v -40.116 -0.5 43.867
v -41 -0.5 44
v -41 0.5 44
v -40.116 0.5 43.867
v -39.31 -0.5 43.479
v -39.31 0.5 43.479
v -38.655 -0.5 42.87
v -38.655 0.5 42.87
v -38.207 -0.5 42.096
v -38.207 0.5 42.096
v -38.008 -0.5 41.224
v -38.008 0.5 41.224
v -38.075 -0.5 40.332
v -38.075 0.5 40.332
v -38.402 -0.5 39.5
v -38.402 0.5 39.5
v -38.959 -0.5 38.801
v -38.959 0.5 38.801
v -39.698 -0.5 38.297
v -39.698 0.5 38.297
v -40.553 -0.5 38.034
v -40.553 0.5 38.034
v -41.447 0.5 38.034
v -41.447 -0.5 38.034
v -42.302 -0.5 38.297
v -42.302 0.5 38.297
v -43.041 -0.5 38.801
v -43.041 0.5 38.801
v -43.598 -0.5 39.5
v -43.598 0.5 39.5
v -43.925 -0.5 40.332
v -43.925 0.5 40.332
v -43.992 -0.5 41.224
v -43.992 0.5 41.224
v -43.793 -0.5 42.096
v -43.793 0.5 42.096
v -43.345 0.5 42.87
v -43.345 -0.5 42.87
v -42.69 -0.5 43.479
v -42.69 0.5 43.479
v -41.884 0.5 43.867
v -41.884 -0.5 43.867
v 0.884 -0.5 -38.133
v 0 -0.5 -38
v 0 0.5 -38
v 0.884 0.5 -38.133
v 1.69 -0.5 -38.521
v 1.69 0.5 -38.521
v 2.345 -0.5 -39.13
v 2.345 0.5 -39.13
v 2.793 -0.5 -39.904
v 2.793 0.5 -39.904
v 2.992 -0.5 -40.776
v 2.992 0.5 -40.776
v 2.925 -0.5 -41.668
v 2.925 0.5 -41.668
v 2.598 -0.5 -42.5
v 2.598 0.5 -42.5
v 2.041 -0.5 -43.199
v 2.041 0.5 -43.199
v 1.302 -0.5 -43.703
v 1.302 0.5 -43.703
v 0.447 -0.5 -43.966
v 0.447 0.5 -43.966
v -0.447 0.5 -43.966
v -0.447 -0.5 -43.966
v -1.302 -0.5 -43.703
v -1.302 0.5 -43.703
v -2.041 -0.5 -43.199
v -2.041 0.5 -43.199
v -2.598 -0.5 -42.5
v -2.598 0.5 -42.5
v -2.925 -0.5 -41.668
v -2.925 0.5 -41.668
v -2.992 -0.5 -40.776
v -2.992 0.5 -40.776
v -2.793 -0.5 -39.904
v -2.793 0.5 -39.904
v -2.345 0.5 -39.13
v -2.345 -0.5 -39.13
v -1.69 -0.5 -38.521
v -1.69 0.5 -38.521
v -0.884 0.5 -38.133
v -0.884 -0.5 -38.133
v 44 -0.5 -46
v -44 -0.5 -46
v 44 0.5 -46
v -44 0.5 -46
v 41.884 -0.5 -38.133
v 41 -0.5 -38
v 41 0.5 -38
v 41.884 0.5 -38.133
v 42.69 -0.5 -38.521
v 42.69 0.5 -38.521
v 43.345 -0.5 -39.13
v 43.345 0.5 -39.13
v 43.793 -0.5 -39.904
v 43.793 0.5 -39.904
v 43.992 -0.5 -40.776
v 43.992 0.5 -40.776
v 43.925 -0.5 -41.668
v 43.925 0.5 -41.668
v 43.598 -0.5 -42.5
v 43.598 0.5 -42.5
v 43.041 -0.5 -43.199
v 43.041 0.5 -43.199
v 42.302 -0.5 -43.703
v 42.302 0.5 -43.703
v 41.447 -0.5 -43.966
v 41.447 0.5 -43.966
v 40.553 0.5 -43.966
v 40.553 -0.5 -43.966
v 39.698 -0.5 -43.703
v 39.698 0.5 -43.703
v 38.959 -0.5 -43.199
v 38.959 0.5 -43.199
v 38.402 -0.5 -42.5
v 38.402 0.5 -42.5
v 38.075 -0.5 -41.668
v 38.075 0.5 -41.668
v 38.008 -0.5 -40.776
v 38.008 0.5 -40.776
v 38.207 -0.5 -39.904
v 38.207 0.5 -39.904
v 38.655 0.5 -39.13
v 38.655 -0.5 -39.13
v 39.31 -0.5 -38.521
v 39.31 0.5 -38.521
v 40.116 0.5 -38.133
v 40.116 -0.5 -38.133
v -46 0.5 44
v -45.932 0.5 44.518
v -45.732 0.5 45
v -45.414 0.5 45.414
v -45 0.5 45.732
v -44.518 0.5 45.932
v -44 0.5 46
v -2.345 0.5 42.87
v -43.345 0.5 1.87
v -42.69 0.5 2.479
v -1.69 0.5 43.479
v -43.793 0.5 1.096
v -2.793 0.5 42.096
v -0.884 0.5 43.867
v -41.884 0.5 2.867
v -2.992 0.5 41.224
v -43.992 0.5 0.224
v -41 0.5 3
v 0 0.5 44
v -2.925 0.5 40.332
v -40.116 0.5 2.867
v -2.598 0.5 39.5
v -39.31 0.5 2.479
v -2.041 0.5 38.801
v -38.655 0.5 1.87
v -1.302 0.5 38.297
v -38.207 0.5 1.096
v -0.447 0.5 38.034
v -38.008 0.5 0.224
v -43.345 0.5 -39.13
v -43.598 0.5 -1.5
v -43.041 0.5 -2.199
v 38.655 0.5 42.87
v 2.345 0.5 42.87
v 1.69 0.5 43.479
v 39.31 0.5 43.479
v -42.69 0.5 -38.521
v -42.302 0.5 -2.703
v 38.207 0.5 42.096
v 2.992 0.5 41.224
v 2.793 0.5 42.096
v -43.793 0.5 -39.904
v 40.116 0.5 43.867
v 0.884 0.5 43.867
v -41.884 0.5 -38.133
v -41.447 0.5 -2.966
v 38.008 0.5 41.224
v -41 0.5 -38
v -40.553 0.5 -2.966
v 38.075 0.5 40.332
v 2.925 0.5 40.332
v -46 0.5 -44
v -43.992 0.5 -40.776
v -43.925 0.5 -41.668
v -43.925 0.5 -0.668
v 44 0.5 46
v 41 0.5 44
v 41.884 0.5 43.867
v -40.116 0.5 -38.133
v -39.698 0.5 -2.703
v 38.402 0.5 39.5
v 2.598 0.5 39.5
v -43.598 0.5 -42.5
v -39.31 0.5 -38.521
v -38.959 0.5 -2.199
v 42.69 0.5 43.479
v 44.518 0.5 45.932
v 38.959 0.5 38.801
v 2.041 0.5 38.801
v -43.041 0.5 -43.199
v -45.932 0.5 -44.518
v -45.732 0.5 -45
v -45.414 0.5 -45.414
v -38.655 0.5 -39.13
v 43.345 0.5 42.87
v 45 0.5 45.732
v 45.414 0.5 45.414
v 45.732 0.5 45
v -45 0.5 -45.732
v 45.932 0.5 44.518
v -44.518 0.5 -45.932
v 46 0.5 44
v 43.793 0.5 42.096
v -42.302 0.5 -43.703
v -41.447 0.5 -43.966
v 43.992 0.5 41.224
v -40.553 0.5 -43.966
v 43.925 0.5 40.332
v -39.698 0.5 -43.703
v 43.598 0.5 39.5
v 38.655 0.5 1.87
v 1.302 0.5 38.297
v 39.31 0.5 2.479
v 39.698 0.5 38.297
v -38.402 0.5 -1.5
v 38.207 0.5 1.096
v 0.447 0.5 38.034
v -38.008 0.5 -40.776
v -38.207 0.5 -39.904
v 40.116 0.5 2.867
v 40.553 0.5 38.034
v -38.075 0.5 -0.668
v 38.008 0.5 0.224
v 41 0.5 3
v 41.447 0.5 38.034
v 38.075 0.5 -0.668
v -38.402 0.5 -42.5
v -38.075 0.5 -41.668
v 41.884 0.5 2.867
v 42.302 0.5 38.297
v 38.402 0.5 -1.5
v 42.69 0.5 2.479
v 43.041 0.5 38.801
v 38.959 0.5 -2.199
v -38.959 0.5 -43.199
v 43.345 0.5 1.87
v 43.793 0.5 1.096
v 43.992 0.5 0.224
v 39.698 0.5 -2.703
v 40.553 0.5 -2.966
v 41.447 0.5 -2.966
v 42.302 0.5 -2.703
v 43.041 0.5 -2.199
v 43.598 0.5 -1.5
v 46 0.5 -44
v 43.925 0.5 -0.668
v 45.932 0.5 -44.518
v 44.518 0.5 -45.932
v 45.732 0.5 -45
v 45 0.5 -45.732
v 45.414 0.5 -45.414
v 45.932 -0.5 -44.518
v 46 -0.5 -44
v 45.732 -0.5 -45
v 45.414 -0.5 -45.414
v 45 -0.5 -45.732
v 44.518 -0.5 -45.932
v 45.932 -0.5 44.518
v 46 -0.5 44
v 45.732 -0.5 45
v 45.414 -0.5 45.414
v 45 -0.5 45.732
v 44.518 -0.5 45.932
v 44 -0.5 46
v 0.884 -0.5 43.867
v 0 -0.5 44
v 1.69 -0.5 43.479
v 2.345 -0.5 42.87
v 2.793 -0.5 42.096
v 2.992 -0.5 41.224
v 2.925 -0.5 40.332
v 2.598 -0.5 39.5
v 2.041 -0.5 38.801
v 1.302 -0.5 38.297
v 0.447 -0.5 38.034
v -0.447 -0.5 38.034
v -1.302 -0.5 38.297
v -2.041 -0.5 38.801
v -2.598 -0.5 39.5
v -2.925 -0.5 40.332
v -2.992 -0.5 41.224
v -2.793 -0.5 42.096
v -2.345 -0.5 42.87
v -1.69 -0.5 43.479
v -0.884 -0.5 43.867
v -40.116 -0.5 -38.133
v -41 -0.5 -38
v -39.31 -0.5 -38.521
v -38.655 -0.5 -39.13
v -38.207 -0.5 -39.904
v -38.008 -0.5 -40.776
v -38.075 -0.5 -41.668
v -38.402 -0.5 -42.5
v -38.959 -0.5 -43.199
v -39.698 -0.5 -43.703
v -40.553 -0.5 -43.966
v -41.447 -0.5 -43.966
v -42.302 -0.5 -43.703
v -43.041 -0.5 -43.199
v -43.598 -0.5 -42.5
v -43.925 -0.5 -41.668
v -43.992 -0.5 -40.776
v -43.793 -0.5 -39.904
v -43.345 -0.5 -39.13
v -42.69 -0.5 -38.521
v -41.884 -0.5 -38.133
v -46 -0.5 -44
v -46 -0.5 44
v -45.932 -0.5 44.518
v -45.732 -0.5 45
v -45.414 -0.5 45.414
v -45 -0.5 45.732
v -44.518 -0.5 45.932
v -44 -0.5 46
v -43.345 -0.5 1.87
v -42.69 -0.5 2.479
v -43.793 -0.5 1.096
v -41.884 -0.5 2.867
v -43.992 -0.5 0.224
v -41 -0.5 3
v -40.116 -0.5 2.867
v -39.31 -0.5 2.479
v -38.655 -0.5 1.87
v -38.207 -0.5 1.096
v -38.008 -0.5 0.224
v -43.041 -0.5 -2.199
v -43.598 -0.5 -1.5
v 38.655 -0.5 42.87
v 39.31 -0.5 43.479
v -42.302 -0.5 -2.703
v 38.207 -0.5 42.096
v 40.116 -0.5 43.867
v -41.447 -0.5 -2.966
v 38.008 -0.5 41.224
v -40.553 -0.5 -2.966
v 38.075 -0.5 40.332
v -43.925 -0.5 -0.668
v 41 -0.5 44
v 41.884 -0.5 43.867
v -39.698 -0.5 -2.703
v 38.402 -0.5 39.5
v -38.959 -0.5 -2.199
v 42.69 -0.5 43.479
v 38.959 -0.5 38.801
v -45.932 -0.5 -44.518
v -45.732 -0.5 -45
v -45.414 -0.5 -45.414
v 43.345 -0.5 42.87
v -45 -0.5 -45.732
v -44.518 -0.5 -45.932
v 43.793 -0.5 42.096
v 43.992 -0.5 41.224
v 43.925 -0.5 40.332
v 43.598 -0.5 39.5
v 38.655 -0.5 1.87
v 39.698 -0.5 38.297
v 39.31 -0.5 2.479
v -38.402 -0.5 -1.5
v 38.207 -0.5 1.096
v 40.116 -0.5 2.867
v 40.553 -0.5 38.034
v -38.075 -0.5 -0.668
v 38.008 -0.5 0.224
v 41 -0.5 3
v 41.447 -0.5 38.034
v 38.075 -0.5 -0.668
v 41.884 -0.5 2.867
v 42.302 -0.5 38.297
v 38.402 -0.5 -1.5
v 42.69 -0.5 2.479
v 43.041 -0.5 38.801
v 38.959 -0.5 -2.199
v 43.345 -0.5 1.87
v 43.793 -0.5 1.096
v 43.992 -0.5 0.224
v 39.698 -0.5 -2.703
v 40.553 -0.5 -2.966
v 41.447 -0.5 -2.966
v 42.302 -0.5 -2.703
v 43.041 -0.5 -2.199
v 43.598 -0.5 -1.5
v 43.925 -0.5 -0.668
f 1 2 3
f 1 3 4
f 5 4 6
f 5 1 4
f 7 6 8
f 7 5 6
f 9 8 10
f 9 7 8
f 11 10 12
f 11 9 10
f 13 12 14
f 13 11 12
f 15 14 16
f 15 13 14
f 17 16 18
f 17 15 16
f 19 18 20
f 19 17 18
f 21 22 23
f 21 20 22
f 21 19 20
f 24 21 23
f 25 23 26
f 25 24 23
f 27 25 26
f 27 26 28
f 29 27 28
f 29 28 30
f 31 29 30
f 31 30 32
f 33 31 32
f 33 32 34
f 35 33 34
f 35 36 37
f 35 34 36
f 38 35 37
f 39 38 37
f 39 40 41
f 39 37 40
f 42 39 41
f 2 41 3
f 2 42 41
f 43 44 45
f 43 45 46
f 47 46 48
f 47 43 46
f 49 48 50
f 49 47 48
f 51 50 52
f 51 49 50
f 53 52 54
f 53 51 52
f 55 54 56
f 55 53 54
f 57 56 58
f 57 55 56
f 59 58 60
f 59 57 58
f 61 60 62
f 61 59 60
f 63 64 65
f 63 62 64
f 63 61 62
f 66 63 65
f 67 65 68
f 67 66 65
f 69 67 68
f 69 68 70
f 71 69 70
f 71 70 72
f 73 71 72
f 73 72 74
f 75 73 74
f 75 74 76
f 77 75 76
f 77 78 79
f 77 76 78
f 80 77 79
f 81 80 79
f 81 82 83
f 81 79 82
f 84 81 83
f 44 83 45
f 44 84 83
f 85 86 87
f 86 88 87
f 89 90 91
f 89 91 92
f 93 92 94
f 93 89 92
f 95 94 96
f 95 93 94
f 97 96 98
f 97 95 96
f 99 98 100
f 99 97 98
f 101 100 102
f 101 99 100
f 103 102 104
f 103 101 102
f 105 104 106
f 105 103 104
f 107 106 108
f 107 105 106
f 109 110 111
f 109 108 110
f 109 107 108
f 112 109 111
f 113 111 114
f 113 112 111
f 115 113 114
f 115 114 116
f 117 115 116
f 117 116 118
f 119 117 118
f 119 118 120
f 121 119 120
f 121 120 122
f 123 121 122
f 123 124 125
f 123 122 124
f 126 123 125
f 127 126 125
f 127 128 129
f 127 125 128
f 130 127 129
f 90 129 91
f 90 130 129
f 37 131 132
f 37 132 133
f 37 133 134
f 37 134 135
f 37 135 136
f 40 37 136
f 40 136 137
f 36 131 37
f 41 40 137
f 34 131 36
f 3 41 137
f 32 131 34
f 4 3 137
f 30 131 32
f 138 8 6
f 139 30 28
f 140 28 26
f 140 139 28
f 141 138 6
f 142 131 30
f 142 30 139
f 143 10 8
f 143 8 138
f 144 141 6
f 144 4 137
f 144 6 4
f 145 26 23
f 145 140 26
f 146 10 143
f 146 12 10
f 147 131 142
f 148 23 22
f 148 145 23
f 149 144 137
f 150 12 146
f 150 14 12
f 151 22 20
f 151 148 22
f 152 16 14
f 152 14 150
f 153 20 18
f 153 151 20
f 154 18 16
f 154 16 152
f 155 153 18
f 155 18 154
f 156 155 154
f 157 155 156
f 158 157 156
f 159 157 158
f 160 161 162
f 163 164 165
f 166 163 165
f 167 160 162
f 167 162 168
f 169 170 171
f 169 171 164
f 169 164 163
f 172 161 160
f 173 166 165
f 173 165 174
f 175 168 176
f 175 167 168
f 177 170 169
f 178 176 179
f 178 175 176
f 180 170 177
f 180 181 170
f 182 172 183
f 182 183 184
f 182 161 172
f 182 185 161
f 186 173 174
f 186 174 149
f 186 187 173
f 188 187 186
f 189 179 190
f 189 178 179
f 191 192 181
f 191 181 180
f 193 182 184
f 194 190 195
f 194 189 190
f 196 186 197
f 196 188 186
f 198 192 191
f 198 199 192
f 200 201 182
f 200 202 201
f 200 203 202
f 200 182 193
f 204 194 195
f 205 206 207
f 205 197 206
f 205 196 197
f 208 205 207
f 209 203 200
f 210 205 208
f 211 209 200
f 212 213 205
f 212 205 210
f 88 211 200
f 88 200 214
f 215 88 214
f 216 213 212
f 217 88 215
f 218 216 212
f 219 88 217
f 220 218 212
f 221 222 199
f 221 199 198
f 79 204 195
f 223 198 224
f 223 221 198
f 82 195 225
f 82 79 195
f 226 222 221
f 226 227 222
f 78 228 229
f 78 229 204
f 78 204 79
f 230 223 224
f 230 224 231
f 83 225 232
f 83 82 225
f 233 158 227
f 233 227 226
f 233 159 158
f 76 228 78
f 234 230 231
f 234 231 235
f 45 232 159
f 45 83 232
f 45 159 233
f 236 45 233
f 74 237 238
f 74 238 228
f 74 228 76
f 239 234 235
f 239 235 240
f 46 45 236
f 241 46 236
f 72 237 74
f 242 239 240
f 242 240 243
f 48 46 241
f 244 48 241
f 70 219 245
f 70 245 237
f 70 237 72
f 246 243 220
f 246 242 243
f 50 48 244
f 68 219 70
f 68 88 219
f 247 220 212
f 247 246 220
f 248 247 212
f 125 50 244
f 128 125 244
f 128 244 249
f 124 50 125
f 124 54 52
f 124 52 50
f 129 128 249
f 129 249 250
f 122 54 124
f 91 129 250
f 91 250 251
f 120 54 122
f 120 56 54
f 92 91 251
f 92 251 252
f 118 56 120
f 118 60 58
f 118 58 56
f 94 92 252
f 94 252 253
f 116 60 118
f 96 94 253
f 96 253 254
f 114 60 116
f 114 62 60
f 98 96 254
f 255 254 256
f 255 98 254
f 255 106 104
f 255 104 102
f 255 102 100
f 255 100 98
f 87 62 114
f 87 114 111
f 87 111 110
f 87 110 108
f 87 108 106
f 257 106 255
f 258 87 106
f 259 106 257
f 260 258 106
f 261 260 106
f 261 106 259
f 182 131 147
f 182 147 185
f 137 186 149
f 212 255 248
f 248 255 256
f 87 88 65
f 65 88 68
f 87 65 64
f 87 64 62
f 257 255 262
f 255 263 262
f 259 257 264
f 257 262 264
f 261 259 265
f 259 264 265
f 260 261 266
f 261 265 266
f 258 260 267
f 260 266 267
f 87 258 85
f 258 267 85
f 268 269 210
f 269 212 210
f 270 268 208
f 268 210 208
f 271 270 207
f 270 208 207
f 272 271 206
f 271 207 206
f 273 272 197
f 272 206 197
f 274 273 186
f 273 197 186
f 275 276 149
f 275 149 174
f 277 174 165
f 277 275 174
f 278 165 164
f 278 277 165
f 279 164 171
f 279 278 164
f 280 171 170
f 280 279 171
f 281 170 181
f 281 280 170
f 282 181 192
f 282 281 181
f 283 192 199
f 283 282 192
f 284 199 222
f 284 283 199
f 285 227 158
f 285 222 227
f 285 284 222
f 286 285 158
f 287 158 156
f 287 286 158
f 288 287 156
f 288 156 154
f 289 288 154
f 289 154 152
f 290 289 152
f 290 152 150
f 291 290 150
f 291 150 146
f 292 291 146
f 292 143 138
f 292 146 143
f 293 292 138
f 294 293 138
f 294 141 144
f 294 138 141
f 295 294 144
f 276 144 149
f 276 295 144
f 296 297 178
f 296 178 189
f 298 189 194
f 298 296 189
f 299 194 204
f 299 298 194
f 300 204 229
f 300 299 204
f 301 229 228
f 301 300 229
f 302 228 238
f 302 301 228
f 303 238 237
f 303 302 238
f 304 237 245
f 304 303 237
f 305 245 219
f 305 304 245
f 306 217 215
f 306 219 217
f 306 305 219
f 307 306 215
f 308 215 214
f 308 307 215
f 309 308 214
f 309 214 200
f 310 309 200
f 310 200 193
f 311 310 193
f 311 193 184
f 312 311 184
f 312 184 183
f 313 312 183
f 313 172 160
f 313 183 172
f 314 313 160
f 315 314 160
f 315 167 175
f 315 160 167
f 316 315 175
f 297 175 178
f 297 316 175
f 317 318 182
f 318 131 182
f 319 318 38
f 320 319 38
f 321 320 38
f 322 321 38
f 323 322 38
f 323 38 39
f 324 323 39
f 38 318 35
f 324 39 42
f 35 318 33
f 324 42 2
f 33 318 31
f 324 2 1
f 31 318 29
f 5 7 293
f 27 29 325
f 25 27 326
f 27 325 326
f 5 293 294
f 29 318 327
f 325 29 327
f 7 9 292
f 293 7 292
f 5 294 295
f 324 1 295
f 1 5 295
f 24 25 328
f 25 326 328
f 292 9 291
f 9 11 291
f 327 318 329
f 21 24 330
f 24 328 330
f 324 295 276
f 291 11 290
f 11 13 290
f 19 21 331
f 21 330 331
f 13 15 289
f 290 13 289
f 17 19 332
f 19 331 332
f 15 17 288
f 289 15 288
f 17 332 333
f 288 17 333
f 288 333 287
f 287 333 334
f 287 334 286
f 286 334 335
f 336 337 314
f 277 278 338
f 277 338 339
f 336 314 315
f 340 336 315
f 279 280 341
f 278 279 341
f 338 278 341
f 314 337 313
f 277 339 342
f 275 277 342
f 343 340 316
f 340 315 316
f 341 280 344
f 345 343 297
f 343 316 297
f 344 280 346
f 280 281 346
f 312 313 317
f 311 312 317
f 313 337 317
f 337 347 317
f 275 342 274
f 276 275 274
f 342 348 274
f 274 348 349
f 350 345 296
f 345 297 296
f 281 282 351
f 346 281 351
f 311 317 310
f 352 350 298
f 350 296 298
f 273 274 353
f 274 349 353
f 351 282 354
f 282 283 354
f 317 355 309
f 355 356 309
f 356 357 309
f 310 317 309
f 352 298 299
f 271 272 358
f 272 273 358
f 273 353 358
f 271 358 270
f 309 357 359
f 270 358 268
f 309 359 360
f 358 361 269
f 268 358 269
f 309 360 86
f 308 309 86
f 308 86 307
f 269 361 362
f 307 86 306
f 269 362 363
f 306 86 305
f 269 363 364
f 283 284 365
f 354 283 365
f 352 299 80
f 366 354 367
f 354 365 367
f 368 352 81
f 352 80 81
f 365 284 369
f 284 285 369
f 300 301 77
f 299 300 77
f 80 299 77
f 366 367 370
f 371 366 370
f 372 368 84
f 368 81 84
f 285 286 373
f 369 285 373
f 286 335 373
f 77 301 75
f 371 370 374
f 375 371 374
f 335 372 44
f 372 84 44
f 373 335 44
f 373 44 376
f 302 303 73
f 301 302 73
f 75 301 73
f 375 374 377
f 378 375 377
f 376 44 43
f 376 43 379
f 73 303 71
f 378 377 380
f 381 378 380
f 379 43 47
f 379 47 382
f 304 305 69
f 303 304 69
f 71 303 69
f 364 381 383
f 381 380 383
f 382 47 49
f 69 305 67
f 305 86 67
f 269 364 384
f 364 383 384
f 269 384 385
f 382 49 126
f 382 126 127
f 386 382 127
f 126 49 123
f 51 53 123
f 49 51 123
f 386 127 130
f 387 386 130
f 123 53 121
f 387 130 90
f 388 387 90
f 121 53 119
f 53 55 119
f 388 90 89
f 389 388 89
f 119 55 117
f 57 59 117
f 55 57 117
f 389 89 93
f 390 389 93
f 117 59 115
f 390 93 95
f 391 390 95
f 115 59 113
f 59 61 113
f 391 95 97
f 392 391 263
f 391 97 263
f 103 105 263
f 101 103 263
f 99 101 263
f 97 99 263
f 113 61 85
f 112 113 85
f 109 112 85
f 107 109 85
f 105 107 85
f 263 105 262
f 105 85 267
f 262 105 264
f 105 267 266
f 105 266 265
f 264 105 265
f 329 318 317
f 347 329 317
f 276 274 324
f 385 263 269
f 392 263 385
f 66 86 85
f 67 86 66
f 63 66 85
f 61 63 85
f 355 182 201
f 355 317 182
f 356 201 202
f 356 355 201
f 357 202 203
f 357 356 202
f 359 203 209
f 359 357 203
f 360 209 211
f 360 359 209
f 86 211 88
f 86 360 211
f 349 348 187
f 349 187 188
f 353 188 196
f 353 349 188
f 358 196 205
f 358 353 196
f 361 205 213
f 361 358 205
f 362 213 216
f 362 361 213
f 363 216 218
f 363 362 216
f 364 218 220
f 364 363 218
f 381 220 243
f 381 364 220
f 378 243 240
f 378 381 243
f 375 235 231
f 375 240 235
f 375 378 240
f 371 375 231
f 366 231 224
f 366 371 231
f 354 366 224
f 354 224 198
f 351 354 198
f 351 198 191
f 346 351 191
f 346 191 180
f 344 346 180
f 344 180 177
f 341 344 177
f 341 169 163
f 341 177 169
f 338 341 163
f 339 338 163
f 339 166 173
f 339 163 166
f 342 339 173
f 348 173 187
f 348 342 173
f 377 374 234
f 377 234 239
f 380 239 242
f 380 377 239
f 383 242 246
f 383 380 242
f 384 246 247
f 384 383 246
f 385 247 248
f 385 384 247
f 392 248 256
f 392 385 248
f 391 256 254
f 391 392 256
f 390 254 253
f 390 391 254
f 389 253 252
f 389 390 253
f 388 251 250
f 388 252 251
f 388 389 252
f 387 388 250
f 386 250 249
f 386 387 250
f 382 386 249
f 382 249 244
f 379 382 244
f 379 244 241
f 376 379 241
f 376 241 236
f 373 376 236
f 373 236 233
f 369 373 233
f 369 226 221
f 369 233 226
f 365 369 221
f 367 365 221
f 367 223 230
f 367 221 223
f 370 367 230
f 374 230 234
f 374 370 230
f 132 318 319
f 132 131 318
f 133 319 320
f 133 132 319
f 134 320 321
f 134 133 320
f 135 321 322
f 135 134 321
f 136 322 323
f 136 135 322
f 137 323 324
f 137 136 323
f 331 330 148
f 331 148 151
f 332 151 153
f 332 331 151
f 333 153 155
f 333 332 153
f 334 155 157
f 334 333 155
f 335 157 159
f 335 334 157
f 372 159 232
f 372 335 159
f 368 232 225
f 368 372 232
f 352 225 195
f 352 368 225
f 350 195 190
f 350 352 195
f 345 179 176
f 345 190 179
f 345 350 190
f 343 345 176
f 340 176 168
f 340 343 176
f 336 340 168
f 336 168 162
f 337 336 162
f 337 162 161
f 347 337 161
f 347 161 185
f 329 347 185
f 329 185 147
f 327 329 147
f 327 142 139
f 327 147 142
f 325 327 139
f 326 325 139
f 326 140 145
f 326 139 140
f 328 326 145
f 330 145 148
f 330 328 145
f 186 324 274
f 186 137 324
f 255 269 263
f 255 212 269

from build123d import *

# Parameters (mm, degrees)
SKETCH1_W               = 92
SKETCH1_H               = 92
BOSS_EXTRUDE1_DEPTH     = 0.5
FILLET1_R               = 2
CUT_EXTRUDE1_DEPTH      = 66.061509358
CUT_EXTRUDE1_DEPTH_BACK = 66.061509358
SKETCH2_R               = 3


with BuildPart() as part:
    # Sketch1 → Boss-Extrude1 (new, symmetric)
    with BuildSketch(Plane(origin=(0, 0, 0), x_dir=(1, 0, 0), z_dir=(0, 1, 0))):
        Rectangle(SKETCH1_W, SKETCH1_H)
    extrude(amount=BOSS_EXTRUDE1_DEPTH, both=True)

    # Fillet1
    fillet1_edges = [part.edges().sort_by_distance(p)[0] for p in [
        (46, 0, 46),
        (-46, 0, 46),
        (-46, 0, -46),
        (46, 0, -46),
    ]]
    fillet(fillet1_edges, radius=FILLET1_R)

    # Sketch2 → Cut-Extrude1 (cut, two sides: drawn at the far end of the back side and taken through both)
    with BuildSketch(Plane(origin=(0, 0.5, 0), x_dir=(1, 0, 0), z_dir=(0, 1, 0)).offset(-CUT_EXTRUDE1_DEPTH_BACK)):
        with Locations(Location((-41, 41, 0), (0, 0, 270))):
            Circle(SKETCH2_R)
        with Locations(Location((0, 41, 0), (0, 0, 270))):
            Circle(SKETCH2_R)
        with Locations(Location((41, 41, 0), (0, 0, 270))):
            Circle(SKETCH2_R)
        with Locations(Location((41, 0, 0), (0, 0, 270))):
            Circle(SKETCH2_R)
        with Locations(Location((41, -41, 0), (0, 0, 270))):
            Circle(SKETCH2_R)
        with Locations(Location((0, -41, 0), (0, 0, 270))):
            Circle(SKETCH2_R)
        with Locations(Location((-41, -41, 0), (0, 0, 270))):
            Circle(SKETCH2_R)
        with Locations(Location((-41, 0, 0), (0, 0, 270))):
            Circle(SKETCH2_R)
    extrude(amount=CUT_EXTRUDE1_DEPTH + CUT_EXTRUDE1_DEPTH_BACK, mode=Mode.SUBTRACT)


solid = part.part
